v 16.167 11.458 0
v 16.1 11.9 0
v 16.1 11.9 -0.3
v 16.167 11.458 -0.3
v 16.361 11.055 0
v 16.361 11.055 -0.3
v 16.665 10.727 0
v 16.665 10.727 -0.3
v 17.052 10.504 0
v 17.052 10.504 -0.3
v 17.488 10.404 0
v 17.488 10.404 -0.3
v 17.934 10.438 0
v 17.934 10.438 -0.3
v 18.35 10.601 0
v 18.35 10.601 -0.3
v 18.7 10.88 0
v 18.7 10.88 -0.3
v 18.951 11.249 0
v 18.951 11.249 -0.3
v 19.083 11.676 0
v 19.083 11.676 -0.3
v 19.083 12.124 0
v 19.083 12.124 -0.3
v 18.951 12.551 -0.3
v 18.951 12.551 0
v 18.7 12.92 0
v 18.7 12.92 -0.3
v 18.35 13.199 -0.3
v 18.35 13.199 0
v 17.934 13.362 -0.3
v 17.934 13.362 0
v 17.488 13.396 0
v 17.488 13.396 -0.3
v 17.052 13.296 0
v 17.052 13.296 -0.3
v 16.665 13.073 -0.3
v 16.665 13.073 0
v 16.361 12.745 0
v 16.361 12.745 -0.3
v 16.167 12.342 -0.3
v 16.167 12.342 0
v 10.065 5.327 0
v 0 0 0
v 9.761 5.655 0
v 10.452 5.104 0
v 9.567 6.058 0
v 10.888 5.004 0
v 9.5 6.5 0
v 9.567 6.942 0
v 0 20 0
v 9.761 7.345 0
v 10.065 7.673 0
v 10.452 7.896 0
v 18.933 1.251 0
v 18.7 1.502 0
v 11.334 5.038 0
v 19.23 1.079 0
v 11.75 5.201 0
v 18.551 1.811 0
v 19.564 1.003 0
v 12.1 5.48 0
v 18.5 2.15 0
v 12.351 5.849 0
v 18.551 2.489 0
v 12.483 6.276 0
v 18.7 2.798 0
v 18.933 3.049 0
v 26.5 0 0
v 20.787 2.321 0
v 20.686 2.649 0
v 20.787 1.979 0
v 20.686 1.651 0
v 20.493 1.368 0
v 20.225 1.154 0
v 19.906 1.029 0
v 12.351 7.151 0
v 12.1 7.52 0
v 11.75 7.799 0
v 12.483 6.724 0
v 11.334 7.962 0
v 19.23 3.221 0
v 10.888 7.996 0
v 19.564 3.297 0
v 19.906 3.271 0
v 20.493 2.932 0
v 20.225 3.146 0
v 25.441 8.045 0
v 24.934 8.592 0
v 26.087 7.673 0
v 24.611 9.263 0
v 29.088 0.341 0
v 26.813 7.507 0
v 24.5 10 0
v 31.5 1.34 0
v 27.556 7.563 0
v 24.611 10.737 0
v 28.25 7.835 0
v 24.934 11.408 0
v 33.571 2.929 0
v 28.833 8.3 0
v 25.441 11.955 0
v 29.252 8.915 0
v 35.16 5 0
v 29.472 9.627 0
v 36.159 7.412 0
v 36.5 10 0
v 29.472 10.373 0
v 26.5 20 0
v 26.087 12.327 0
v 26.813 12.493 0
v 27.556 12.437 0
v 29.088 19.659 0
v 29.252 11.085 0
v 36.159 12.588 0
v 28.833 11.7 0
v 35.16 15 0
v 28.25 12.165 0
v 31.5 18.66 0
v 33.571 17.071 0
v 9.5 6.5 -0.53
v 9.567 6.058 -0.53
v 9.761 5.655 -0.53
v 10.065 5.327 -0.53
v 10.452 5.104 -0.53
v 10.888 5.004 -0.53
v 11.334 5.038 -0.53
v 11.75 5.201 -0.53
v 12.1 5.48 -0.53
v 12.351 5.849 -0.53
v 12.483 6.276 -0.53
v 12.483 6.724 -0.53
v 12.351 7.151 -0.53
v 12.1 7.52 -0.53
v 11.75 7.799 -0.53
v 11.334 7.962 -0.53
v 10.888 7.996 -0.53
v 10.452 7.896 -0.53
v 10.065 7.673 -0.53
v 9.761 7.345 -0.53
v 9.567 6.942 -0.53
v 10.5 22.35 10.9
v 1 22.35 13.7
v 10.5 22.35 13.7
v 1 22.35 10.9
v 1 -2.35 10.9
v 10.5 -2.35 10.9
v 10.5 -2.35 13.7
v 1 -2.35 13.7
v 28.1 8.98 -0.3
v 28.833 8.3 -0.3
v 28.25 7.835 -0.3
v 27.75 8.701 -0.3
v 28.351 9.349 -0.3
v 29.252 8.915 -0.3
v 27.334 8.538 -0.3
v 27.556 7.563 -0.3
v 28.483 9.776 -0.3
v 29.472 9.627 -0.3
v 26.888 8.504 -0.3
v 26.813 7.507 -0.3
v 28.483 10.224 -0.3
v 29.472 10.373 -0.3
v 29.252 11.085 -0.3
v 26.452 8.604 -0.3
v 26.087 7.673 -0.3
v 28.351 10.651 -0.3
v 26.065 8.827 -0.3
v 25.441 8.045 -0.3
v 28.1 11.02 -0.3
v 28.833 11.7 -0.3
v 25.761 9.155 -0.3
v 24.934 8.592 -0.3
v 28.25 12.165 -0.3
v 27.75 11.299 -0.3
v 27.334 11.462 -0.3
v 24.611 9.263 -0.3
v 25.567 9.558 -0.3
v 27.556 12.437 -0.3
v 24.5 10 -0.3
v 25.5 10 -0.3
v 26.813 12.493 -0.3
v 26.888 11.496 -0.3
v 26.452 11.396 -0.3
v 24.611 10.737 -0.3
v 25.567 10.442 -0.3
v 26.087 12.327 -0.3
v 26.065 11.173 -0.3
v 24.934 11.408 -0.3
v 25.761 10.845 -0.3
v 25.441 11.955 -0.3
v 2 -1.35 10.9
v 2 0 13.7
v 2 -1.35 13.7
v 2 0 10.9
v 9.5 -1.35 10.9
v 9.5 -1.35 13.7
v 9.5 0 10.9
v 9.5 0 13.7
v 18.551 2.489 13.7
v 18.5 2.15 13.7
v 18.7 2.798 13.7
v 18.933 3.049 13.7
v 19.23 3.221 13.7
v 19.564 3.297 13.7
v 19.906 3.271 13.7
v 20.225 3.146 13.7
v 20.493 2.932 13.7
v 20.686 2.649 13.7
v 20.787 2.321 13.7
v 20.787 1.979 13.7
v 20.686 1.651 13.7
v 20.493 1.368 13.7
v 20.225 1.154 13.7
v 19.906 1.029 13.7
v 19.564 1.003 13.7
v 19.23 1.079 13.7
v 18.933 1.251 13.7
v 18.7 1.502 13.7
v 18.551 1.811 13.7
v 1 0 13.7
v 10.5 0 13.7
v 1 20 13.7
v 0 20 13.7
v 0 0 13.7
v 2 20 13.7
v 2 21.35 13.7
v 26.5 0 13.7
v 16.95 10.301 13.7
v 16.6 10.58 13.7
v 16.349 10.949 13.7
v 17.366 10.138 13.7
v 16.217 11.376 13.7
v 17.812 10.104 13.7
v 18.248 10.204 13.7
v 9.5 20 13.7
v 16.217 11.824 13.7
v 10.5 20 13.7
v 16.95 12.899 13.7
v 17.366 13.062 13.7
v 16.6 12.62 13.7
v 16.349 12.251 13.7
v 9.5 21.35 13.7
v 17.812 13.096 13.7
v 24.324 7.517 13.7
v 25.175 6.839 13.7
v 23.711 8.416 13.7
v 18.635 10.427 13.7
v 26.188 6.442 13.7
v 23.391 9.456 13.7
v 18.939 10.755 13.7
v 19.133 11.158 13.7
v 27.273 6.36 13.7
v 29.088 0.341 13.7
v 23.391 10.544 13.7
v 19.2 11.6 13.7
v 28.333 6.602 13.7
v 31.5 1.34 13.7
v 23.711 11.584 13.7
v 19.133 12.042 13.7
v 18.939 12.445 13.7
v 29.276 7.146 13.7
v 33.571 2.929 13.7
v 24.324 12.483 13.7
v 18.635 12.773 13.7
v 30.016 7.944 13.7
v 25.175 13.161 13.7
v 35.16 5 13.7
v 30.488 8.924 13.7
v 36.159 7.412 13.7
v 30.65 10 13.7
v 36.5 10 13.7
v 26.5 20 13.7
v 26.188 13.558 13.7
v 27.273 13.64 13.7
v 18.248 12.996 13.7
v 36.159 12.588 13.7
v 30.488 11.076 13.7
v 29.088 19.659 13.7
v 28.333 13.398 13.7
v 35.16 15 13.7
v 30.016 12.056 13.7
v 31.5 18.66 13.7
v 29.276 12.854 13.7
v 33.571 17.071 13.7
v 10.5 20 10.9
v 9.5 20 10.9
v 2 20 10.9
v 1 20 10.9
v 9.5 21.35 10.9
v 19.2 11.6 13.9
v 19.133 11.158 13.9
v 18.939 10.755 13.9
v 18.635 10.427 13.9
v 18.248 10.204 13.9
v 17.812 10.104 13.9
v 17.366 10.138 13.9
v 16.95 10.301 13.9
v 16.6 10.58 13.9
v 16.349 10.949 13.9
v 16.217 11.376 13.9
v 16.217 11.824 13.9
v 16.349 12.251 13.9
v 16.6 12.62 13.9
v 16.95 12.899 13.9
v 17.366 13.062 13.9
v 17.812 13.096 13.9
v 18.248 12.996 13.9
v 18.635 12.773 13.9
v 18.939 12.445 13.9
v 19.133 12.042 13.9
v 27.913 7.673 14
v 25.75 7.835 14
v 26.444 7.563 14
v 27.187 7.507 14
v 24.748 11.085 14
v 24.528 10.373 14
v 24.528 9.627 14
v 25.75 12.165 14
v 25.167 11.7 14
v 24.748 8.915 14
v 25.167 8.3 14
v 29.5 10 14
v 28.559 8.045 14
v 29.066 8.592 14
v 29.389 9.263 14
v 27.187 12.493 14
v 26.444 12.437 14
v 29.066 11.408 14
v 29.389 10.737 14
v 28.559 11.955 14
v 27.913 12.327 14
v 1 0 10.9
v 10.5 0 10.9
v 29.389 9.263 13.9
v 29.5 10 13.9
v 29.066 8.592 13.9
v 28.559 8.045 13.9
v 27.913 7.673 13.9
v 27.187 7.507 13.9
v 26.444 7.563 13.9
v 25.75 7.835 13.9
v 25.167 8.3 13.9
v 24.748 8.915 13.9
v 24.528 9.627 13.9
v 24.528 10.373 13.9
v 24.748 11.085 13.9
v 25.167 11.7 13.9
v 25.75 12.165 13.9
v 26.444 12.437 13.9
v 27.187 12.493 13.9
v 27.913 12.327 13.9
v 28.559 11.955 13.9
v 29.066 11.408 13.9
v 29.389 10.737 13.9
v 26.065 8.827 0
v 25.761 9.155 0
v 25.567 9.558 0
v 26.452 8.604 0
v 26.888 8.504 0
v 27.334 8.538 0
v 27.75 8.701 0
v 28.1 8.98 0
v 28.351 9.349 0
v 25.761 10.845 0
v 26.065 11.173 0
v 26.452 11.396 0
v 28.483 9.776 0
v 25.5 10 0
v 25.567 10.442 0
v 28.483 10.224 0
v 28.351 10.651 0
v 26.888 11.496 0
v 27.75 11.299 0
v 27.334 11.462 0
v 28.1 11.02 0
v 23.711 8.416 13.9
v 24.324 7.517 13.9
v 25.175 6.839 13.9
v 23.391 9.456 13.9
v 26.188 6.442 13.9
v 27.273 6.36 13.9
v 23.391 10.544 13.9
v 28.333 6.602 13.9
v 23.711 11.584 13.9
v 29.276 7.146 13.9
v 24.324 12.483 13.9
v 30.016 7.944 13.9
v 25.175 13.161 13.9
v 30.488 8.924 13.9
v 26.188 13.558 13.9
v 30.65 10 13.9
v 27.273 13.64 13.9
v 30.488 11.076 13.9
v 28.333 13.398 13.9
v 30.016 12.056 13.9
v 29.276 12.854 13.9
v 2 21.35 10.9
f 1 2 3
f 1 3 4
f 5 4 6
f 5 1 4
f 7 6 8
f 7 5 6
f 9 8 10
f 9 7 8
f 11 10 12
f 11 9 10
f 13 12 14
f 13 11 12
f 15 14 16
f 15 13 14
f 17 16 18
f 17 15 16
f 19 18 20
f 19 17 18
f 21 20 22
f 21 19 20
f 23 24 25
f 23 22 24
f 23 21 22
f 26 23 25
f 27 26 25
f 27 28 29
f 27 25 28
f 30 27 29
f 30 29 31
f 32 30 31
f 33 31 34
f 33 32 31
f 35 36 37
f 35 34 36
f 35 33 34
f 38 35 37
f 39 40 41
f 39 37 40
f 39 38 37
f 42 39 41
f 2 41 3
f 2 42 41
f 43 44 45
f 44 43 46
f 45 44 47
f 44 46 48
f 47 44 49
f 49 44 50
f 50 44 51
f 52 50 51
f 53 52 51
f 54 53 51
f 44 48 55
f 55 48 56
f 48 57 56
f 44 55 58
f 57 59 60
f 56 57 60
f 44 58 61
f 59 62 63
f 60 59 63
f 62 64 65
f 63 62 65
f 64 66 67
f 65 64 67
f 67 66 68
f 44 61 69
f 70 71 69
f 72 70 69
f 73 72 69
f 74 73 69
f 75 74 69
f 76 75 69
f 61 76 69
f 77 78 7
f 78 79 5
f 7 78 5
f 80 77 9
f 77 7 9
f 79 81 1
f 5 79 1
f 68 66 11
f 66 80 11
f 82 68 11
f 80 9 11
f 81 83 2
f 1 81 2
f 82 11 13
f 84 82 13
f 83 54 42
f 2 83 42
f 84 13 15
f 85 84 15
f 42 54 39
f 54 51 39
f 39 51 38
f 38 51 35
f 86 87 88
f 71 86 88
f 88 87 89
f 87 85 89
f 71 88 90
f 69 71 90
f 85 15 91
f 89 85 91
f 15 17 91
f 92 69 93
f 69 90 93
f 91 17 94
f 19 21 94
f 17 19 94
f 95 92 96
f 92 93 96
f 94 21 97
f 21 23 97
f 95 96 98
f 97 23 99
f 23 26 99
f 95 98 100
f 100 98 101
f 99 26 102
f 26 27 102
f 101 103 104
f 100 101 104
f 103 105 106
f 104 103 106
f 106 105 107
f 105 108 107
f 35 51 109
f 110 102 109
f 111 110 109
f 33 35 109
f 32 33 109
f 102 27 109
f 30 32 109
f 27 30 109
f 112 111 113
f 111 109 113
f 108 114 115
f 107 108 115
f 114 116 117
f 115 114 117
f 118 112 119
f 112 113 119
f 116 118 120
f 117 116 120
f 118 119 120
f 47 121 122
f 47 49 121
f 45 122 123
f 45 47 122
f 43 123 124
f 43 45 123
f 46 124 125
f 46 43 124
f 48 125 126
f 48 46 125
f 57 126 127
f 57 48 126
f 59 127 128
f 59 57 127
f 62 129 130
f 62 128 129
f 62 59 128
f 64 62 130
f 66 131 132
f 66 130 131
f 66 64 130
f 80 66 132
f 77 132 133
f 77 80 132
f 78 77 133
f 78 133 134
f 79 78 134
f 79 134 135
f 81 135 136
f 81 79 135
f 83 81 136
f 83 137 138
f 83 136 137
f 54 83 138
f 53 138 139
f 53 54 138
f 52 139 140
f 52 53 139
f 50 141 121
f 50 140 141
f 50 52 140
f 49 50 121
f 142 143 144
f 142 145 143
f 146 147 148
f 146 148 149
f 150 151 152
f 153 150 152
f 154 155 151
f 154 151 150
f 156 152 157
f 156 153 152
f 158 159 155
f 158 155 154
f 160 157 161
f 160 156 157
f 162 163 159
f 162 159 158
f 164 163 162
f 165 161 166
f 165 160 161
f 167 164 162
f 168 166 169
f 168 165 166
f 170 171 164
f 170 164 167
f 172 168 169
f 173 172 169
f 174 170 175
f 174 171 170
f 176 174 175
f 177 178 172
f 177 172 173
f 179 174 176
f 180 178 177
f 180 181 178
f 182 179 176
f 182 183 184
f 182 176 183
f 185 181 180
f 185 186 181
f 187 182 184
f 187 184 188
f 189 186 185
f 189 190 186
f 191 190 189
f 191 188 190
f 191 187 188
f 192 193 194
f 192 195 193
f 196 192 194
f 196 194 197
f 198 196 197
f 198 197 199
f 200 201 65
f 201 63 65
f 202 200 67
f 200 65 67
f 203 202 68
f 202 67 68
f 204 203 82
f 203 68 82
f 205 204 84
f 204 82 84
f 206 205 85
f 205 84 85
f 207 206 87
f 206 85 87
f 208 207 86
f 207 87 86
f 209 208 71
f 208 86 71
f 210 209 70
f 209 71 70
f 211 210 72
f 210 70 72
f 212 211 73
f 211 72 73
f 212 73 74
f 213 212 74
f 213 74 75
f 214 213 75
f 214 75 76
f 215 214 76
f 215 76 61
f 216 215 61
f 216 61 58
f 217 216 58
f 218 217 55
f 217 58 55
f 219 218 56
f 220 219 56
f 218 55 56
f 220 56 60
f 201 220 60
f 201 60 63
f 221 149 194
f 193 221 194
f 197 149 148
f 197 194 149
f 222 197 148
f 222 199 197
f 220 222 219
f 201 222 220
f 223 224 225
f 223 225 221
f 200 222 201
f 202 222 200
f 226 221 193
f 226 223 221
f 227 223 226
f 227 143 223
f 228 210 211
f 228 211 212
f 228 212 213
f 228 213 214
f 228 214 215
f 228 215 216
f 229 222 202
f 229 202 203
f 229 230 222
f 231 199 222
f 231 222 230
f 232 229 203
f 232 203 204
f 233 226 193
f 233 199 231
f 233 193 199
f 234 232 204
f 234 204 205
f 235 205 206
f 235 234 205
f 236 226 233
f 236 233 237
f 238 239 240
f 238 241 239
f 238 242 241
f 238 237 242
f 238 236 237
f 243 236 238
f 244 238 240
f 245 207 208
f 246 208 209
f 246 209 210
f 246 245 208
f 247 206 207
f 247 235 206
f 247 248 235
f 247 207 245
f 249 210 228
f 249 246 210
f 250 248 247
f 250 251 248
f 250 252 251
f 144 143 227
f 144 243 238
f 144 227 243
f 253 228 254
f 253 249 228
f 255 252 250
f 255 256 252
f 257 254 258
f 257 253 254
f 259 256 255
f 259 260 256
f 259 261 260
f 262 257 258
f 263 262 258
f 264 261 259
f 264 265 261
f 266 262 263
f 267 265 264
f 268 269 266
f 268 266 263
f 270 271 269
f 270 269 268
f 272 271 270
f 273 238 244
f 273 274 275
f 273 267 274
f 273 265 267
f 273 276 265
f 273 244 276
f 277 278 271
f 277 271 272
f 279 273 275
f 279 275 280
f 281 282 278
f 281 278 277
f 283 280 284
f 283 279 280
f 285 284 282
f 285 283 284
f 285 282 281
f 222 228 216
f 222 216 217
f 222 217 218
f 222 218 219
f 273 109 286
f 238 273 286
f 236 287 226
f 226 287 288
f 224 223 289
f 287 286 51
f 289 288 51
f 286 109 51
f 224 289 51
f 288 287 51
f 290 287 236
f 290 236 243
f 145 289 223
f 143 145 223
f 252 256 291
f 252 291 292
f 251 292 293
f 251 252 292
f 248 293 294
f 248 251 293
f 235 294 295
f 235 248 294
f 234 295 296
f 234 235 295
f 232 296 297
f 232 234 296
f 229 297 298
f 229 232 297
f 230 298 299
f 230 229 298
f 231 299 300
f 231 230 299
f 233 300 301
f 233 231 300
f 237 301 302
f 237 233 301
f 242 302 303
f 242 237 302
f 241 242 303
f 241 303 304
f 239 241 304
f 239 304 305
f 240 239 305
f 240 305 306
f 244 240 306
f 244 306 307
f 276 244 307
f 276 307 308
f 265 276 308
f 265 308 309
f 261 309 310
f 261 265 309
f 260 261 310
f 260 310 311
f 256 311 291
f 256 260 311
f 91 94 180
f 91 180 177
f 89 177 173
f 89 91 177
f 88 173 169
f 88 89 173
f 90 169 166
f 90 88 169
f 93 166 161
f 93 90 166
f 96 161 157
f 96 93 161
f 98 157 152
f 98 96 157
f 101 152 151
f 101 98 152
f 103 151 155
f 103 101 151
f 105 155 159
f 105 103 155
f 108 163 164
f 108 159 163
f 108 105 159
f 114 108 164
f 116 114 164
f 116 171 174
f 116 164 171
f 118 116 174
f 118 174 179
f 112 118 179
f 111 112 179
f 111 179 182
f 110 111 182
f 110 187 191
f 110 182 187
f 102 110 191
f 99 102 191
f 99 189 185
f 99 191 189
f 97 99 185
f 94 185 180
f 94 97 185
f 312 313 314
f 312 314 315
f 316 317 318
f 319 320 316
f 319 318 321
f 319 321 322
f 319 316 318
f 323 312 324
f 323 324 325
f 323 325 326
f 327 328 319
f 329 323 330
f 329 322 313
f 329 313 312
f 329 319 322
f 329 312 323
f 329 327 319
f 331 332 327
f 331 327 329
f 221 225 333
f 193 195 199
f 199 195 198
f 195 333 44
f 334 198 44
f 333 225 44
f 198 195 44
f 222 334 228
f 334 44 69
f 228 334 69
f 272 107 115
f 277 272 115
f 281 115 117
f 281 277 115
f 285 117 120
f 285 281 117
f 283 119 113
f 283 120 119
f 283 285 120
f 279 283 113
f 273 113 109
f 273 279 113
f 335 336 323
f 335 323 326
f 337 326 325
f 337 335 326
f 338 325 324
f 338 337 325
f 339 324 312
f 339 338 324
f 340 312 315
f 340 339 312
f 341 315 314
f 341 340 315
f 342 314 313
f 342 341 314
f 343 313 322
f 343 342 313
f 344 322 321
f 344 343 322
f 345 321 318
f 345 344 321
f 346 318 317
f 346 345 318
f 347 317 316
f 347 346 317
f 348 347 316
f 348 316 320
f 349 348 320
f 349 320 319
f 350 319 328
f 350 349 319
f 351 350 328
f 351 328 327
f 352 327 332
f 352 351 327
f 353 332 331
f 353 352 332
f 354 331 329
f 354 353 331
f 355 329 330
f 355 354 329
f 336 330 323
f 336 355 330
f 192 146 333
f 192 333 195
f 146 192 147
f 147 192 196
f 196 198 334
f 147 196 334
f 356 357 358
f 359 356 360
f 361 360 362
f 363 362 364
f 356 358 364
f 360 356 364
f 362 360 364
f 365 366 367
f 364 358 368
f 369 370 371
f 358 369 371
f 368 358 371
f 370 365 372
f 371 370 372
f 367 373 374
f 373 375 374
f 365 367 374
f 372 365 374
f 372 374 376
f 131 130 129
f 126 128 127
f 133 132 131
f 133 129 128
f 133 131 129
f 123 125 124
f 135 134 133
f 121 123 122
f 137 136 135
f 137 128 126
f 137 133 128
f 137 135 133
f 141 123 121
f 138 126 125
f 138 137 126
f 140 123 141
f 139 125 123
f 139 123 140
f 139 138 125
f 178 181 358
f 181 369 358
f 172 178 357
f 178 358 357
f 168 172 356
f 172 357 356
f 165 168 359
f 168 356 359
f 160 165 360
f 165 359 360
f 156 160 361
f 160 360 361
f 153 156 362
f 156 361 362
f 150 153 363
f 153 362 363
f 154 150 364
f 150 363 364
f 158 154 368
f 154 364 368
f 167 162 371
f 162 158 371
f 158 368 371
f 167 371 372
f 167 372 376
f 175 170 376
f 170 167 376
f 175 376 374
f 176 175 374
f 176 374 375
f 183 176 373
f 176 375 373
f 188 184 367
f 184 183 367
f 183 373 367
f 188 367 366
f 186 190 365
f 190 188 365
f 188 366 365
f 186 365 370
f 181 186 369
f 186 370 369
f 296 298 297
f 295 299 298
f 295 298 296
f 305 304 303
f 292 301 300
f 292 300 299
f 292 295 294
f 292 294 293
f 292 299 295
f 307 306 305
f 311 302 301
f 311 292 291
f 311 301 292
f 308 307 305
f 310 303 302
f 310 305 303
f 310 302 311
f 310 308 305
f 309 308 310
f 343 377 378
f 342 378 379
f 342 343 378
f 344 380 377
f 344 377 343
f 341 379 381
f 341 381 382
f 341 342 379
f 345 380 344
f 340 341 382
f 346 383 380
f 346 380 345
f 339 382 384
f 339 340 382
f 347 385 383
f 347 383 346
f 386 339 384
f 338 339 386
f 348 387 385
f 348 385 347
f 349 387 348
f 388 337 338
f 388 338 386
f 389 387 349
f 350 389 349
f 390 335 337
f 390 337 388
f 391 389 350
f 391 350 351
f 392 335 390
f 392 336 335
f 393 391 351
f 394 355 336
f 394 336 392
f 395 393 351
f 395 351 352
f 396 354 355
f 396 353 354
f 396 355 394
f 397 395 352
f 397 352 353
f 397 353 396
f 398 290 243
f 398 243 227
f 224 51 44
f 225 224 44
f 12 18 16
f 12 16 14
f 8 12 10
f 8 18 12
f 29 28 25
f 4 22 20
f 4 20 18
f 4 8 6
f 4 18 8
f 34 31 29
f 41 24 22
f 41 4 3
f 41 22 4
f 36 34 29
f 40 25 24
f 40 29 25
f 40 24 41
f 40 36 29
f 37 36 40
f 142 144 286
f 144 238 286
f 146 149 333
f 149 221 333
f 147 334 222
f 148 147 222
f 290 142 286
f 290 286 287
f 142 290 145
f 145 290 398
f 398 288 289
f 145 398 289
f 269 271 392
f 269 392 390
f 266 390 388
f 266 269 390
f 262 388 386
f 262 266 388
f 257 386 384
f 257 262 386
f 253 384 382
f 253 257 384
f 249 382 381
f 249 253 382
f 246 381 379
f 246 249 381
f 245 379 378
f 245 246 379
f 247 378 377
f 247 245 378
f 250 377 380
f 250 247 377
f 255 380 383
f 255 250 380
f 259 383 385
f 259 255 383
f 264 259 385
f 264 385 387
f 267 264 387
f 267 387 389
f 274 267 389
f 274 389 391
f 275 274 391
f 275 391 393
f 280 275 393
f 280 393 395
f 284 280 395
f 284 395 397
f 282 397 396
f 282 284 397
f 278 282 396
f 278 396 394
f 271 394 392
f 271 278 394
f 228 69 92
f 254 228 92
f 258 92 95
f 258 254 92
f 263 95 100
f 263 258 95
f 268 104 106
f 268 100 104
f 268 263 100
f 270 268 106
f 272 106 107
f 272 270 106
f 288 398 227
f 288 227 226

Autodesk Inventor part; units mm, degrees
ref_plane "YZ Plane" through (0, 0, 0) normal (1, 0, 0) x (0, 1, 0)
ref_plane "XZ Plane" through (0, 0, 0) normal (0, 1, 0) x (-1, 0, 0)
sketch "Skizze1" plane through (0, 0, 0) normal (0, 0, 1) x (1, 0, 0)
  line L0 (0, 0) -> (36.5, 0)
  line L1 (36.5, 0) -> (36.5, 20)
  line L2 (36.5, 20) -> (0, 20)
  line L3 (0, 20) -> (0, 0)
  dimension "d0" = 36.5
  dimension "d1" = 20
extrude "Extrusion1" add sketch "Skizze1" along normal blind 13.7
ref_plane "Arbeitsebene1" through (0, 10, 0) normal (0, 1, 0) x (1, 0, 0)
fillet "Rundung1" radius 10 2 edges at (36.5, 20, 6.85) (36.5, 0, 6.85)
sketch "Skizze2" plane through (0, 0, 0) normal (0, 0, -1) x (-1, 0, 0)
  arc A0 (-26.5, 20) -> (-26.5, 0) centre (-26.5, 10) ccw projected
  circle A1 centre (-27, 10) radius 2.5
  circle A2 centre (-27, 10) radius 1.5
  dimension "d5" = 5
  dimension "d6" = 10
  dimension "d7" = 12
  dimension "d8" = 3
extrude "Extrusion2" add sketch "Skizze2" along normal blind 0.3
sketch "Skizze4" plane through (0, 0, 0) normal (0, 0, -1) x (-1, 0, 0)
  line L0 (0, 0) -> (-26.5, 0) projected
  line L1 (0, 20) -> (0, 0) projected
  circle A0 centre (-19.65, 2.15) radius 1.15
  dimension "d15" = 2.3
  dimension "d16" = 1
  dimension "d17" = 18.5
extrude "Extrusion4" cut sketch "Skizze4" against normal through all
sketch "Skizze5" plane through (0, 0, 0) normal (0, 0, -1) x (-1, 0, 0)
  line L0 (0, 0) -> (-26.5, 0) projected
  line L1 (0, 20) -> (0, 0) projected
  circle A0 centre (-11, 6.5) radius 1.5
  dimension "d21" = 3
  dimension "d23" = 5
  dimension "d24" = 9.5
extrude "Extrusion8" add sketch "Skizze5" along normal blind 0.53
sketch "Skizze6" plane through (0, 0, 0) normal (0, 0, -1) x (-1, 0, 0)
  line L0 (0, 20) -> (0, 0) projected
  line L1 (-26.5, 20) -> (0, 20) projected
  circle A0 centre (-17.6, 11.9) radius 1.5
  dimension "d27" = 3
  dimension "d28" = 6.6
  dimension "d29" = 16.1
extrude "Extrusion5" add sketch "Skizze6" along normal up to surface (0.3 mm away)
sketch "Skizze7" plane through (0, 0, 13.7) normal (0, 0, 1) x (1, 0, 0)
  line L0 (0, 20) -> (0, 0) projected
  line L1 (0, 0) -> (26.5, 0) projected
  circle A0 centre (27, 10) radius 2.5 projected
  circle A1 centre (27, 10) radius 3.65
  circle A2 centre (17.7, 11.6) radius 1.5
  dimension "d34" = 7.3
  dimension "d40" = 3
  dimension "d42" = 10.1
  dimension "d43" = 19.2
extrude "Extrusion9" add sketch "Skizze7" along normal blind 0.2
sketch "Skizze8" plane through (27, 10, 13.7) normal (0, 0, 1) x (1, 0, 0)
  circle A0 centre (0, 0) radius 2.5 projected
  point P0 (-27, -10)
extrude "Extrusion10" add sketch "Skizze8" along normal blind 0.3
sketch "Skizze11" plane through (0, 20, 13.7) normal (0, 1, 0) x (1, 0, 0)
  line L0 (0, 13.7) -> (0, 0) projected
  line L1 (26.5, 0) -> (0, 0) projected
  line L2 (1, 0) -> (10.5, 0)
  line L3 (10.5, 0) -> (10.5, 2.8)
  line L4 (10.5, 2.8) -> (1, 2.8)
  line L5 (1, 2.8) -> (1, 0)
  dimension "d49" = 9.5
  dimension "d50" = 2.8
  dimension "d51" = 1
extrude "Extrusion11" add sketch "Skizze11" along normal blind 2.35
sketch "Skizze12" plane through (10.5, 20, 10.9) normal (0, 0, -1) x (-1, 0, 0)
  line L0 (9.5, 0) -> (0, 0) projected
  line L1 (9.5, 0) -> (9.5, 2.35) projected
  line L2 (0, 2.35) -> (9.5, 2.35) projected
  line L3 (0, 0) -> (0, 2.35) projected
  line L4 (1, 1.35) -> (8.5, 1.35)
  line L5 (8.5, 1.35) -> (8.5, 0)
  line L6 (8.5, 0) -> (1, 0)
  line L7 (1, 0) -> (1, 1.35)
  point P0 (10.5, -20)
  dimension "d54" = 1
  dimension "d55" = 1
  dimension "d56" = 1
extrude "Extrusion12" cut sketch "Skizze12" against normal through all contours L0 L7 L4 L5
mirror "Spiegeln1" about plane through (0, 10, 0) normal (0, 1, 0) of "Extrusion12", "Extrusion11"
properties part number "front"
